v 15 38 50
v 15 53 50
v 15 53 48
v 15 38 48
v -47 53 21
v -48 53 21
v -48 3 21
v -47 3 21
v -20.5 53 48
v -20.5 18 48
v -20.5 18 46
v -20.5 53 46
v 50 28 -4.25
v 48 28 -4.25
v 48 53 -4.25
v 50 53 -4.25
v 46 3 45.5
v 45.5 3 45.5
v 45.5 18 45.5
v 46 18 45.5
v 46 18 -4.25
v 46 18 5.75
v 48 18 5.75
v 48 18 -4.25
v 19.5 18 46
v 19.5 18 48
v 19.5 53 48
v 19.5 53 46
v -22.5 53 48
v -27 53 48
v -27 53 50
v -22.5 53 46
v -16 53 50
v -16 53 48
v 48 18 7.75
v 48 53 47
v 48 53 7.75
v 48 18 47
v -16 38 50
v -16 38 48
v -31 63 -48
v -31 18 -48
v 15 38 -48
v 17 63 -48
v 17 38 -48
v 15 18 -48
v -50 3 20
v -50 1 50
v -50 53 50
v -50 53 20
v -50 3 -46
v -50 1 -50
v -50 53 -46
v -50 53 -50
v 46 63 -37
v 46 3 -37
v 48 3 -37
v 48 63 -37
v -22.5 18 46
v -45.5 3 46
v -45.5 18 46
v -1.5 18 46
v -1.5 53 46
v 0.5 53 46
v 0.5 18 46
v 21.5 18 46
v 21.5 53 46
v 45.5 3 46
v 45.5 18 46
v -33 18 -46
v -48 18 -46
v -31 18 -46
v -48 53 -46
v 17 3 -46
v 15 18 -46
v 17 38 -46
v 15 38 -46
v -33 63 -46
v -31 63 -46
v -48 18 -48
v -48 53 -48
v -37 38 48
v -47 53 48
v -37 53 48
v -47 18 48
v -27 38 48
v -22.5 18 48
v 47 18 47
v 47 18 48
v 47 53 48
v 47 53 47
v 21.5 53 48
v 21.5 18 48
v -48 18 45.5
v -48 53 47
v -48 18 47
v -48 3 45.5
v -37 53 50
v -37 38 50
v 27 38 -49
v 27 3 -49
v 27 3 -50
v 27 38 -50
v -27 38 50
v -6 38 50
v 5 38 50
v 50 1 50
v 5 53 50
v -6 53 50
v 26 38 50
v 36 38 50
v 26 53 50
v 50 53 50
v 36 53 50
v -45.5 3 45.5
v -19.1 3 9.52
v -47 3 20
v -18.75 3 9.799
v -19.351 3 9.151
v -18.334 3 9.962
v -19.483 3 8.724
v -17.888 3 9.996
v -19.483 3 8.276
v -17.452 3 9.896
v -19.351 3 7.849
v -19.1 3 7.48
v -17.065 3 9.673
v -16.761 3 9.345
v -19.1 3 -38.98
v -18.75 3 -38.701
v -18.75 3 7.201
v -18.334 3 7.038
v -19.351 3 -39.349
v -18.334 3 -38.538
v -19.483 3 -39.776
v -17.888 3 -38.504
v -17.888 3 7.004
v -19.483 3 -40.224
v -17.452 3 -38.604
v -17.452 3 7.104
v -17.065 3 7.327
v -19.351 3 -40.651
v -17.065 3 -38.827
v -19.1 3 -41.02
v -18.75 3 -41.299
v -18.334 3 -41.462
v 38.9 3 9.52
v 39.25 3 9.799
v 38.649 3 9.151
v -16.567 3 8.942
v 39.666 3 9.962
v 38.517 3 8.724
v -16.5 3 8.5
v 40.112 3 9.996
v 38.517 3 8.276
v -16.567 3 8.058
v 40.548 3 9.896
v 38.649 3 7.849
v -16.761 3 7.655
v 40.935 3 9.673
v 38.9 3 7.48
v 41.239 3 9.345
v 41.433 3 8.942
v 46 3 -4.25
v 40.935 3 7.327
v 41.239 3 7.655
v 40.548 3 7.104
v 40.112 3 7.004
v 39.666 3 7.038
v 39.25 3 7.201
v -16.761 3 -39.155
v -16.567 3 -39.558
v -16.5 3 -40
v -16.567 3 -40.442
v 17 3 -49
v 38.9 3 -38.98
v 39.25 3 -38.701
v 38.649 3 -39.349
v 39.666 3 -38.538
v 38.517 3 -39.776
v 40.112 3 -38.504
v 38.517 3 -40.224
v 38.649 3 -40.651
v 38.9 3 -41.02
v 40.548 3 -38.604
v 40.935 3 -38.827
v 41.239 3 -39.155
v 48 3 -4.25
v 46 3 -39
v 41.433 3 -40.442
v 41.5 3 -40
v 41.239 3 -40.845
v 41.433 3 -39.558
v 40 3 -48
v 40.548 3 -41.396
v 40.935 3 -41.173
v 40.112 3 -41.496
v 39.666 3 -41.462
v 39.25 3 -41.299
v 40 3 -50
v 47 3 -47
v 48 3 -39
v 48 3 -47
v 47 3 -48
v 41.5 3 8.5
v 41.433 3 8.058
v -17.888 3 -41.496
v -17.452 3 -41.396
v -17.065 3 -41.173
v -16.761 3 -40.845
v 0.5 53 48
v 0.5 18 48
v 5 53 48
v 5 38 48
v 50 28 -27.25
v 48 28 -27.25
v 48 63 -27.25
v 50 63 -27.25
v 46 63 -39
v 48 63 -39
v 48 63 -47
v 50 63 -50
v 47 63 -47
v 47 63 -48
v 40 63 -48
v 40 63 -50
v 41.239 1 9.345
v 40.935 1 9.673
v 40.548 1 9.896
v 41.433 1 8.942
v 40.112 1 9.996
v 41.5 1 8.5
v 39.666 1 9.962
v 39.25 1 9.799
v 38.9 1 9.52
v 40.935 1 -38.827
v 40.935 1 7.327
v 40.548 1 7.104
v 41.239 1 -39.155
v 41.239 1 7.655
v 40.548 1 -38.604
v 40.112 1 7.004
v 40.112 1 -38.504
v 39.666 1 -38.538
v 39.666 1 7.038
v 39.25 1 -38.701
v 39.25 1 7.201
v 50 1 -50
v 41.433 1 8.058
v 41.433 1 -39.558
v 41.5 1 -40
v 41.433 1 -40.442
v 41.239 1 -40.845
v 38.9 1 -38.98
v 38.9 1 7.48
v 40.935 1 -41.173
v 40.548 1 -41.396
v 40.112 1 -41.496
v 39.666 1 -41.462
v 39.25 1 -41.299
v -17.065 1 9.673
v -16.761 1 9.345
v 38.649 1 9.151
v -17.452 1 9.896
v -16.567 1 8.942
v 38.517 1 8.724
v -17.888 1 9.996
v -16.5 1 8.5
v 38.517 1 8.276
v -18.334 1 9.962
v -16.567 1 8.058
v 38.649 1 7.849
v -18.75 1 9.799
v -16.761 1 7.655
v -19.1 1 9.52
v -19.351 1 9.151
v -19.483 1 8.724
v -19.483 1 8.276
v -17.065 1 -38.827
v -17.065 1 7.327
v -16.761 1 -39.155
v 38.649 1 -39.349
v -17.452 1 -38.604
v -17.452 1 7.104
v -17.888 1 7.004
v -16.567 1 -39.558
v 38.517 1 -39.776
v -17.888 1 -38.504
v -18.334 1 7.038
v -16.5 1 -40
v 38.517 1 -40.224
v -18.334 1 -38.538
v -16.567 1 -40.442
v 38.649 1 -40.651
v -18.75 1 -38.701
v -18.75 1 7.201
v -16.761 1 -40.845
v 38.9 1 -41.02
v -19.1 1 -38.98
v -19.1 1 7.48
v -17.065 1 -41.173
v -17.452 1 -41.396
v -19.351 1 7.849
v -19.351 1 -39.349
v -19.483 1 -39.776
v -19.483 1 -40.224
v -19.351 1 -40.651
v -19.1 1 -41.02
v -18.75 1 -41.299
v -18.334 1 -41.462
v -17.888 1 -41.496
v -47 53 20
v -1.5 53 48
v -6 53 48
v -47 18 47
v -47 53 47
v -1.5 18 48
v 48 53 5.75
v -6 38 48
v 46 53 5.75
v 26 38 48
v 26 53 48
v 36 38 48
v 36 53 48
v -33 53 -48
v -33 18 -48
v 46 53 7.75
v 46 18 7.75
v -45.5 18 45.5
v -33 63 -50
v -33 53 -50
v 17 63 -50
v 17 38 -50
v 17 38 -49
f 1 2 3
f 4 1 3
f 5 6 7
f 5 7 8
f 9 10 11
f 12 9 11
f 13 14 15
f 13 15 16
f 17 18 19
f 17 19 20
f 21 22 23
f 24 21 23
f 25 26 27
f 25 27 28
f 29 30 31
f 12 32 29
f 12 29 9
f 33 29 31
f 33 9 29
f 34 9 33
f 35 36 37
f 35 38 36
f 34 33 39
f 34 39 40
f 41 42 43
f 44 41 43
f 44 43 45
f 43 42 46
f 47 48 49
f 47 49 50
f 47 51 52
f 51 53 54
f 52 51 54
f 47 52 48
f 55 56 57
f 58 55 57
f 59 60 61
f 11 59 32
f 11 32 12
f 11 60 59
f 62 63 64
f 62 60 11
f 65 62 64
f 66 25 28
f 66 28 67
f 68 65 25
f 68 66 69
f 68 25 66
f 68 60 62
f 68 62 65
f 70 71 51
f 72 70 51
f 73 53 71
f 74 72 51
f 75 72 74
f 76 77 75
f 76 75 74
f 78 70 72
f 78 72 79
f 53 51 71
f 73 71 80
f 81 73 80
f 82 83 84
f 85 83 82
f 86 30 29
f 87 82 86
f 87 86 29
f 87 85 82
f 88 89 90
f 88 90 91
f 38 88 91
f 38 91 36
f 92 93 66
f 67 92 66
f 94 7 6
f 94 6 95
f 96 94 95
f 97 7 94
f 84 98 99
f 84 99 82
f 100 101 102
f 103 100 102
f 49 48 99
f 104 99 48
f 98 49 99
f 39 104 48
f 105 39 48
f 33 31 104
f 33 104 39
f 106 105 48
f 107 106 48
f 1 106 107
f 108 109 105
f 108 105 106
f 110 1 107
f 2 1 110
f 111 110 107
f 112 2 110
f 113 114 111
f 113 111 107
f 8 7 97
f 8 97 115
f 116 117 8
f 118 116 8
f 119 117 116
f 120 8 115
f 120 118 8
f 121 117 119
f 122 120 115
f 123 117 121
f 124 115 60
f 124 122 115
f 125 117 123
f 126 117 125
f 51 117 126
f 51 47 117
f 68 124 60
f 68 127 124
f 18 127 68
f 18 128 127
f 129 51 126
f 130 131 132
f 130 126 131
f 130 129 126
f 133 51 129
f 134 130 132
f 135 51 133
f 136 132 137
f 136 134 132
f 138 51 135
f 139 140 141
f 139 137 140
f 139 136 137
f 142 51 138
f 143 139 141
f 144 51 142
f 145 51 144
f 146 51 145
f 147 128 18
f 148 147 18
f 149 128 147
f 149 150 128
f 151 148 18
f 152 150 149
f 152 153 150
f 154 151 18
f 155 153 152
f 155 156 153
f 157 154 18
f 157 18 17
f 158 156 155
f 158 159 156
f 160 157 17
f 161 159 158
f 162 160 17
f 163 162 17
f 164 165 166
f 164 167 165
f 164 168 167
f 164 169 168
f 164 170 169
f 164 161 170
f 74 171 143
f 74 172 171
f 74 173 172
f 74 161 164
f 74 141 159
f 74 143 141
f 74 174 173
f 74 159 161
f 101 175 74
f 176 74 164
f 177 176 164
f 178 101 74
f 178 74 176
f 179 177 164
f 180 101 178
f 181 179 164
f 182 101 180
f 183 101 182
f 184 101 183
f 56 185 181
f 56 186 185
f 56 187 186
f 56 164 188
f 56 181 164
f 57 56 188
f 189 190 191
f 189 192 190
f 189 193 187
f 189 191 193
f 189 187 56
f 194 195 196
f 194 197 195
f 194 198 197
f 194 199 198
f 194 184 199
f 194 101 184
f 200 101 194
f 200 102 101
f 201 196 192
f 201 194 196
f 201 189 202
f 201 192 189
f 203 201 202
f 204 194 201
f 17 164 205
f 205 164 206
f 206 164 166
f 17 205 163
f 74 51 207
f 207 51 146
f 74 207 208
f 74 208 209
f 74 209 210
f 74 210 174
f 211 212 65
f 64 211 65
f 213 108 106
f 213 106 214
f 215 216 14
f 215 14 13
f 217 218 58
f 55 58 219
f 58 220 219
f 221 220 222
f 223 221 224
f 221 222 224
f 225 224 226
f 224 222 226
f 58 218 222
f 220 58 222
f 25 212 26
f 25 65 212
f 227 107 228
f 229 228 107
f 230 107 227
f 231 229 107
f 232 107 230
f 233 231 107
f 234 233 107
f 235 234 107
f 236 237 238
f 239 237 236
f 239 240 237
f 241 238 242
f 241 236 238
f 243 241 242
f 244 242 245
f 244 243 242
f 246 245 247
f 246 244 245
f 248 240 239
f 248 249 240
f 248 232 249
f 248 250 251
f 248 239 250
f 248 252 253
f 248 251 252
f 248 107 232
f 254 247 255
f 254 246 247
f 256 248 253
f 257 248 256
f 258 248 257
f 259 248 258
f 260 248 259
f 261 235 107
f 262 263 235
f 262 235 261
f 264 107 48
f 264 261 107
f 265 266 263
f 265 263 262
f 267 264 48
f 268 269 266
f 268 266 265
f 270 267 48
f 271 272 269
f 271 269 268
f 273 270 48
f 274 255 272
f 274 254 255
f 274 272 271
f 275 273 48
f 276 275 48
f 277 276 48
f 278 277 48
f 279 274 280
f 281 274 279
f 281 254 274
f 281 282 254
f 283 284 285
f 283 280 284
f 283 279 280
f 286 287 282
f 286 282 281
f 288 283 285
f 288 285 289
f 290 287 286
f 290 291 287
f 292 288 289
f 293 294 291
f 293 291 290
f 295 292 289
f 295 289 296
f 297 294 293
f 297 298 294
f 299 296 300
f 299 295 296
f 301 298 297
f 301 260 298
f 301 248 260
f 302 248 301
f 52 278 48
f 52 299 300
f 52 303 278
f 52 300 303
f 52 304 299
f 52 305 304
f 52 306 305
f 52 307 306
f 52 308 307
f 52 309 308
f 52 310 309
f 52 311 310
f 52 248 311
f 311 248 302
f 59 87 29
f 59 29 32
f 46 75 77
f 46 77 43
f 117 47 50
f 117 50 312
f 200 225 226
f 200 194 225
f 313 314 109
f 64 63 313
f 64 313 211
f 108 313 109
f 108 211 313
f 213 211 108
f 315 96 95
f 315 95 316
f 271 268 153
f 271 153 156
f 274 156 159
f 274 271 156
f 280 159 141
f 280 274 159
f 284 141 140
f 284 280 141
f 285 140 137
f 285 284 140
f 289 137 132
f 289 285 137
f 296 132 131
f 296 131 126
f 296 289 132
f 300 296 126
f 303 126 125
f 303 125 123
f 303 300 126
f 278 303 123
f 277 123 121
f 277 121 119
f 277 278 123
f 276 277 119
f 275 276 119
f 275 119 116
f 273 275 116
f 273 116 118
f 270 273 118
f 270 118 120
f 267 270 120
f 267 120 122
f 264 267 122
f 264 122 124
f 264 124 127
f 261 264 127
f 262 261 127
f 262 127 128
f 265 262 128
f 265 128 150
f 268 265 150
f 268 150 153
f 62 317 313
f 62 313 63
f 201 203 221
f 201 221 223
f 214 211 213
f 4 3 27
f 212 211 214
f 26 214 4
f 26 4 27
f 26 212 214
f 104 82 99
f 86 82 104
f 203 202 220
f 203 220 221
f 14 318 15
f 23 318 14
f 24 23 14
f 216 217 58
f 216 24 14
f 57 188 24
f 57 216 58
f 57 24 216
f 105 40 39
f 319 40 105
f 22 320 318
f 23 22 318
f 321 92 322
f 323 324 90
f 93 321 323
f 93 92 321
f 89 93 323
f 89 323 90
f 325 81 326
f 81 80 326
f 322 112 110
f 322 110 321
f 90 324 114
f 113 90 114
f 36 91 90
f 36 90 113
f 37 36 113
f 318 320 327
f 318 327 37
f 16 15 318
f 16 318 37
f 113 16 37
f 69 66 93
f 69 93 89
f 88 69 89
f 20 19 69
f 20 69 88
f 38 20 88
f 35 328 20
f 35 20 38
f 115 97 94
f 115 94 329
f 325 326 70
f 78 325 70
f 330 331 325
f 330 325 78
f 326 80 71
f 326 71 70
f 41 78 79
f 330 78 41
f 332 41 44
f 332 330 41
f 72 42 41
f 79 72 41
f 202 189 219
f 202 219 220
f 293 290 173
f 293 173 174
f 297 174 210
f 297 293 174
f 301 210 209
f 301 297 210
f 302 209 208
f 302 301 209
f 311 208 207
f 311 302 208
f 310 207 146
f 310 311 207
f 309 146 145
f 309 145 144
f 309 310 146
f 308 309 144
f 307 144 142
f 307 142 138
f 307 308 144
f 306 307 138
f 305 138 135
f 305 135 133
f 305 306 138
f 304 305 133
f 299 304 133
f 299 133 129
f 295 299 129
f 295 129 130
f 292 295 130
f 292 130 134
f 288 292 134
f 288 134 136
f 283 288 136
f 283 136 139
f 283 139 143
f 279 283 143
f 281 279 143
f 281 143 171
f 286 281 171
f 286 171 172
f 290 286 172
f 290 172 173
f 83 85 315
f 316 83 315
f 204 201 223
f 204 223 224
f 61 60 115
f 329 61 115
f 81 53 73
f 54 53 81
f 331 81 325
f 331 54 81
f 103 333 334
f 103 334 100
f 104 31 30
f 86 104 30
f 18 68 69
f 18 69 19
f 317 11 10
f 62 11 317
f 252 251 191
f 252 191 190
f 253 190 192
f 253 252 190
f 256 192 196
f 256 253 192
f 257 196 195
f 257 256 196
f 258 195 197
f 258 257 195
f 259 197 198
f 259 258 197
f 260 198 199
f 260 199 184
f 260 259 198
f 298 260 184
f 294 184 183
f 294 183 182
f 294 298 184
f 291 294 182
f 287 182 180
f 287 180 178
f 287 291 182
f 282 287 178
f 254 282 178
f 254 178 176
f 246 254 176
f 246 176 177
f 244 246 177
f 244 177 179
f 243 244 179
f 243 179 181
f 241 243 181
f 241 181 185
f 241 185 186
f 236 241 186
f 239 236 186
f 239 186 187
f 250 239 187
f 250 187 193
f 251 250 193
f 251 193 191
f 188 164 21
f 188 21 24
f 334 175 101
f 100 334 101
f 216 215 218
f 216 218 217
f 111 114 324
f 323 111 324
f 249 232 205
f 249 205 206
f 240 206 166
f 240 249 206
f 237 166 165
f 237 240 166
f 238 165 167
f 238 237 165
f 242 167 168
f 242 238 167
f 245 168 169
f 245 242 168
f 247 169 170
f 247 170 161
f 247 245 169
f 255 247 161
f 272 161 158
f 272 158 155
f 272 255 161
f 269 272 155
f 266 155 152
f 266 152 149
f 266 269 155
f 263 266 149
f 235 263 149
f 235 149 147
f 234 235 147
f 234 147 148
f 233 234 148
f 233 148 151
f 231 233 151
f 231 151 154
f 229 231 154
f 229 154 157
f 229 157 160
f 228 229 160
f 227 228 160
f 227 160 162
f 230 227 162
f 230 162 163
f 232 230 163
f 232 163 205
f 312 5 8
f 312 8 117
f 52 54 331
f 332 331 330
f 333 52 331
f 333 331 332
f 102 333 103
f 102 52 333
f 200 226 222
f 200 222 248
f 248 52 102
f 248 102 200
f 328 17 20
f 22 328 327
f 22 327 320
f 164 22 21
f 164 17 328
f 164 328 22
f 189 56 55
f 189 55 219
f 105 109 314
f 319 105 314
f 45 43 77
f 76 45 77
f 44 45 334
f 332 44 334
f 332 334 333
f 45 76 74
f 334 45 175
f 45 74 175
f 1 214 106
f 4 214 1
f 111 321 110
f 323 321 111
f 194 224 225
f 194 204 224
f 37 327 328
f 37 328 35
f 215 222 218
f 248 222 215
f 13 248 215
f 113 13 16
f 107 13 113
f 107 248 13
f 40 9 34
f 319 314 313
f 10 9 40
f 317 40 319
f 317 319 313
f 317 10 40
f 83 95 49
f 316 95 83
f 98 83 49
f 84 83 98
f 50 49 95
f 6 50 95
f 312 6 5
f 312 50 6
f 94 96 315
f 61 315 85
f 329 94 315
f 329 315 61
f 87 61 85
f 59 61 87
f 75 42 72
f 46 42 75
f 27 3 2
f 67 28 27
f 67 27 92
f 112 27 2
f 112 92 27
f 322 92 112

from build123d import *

# Parameters (mm, degrees)
SKICA1_W                  = 100
SKICA1_H                  = 100
P_IDAT_VYSUNUT_M1_DEPTH   = 3
SKICA2_R                  = 1.5
ODEBRAT_VYSUNUT_M5_DEPTH  = 3
SKICA3_W                  = 75
SKICA3_H                  = 2
P_IDAT_VYSUNUT_M4_DEPTH   = 53
SKICA10_W                 = 8
SKICA10_H                 = 2
ODEBRAT_VYSUNUT_M6_DEPTH  = 50
SKICA11_W                 = 10
SKICA11_H                 = 2
ODEBRAT_VYSUNUT_M8_DEPTH  = 15
SKICA16_W                 = 67
SKICA16_H                 = 2
P_IDAT_VYSUNUT_M6_DEPTH   = 15
SKICA17_W                 = 2.5
SKICA17_H                 = 2.5
P_IDAT_VYSUNUT_M7_DEPTH   = 15
SKICA18_W                 = 2.5
SKICA18_H                 = 2.5
P_IDAT_VYSUNUT_M8_DEPTH   = 15
SKICA19_W                 = 1
SKICA19_H                 = 1
P_IDAT_VYSUNUT_M10_DEPTH  = 50
SKICA20_W                 = 1
SKICA20_H                 = 1
P_IDAT_VYSUNUT_M11_DEPTH  = 35
SKICA21_W                 = 1
SKICA21_H                 = 1
P_IDAT_VYSUNUT_M12_DEPTH  = 35
SKICA22_W                 = 1
SKICA22_H                 = 1
P_IDAT_VYSUNUT_M13_DEPTH  = 50
SKICA24_W                 = 91
SKICA24_H                 = 2
P_IDAT_VYSUNUT_M14_DEPTH  = 15
SKICA25_W                 = 2
SKICA25_H                 = 2
P_IDAT_VYSUNUT_M15_DEPTH  = 35
SKICA26_W                 = 2
SKICA26_H                 = 2
P_IDAT_VYSUNUT_M16_DEPTH  = 35
SKICA27_W                 = 2
SKICA27_H                 = 49.75
P_IDAT_VYSUNUT_M17_DEPTH  = 15
SKICA28_W                 = 100
SKICA28_H                 = 5
P_IDAT_VYSUNUT_M18_DEPTH  = 5
SKICA30_W                 = 5
SKICA30_H                 = 90
P_IDAT_VYSUNUT_M19_DEPTH  = 5
SKICA31_W                 = 100
SKICA31_H                 = 100
ODEBRAT_VYSUNUT_M9_DEPTH  = 6
SKICA32_W                 = 2
SKICA32_H                 = 15
ODEBRAT_VYSUNUT_M10_DEPTH = 6
SKICA33_W                 = 2
SKICA33_H                 = 23
P_IDAT_VYSUNUT_M22_DEPTH  = 25
P_IDAT_VYSUNUT_M23_DEPTH  = 10
SKICA35_W                 = 50
SKICA35_H                 = 2
P_IDAT_VYSUNUT_M24_DEPTH  = 10
SKICA36_W                 = 2
SKICA36_H                 = 45
P_IDAT_VYSUNUT_M25_DEPTH  = 2
SKICA37_W                 = 2
SKICA37_H                 = 2
P_IDAT_VYSUNUT_M26_DEPTH  = 60
SKICA38_W                 = 10
SKICA38_H                 = 1
P_IDAT_VYSUNUT_M27_DEPTH  = 35
SKICA40_W                 = 2
SKICA40_H                 = 2
P_IDAT_VYSUNUT_M29_DEPTH  = 35


with BuildPart() as part:
    # Skica1 → Přidat vysunutím1 (new body)
    with BuildSketch(Plane(origin=(0, 0, 0), x_dir=(1, 0, 0), z_dir=(0, 1, 0))):
        Rectangle(SKICA1_W, SKICA1_H)
    extrude(amount=P_IDAT_VYSUNUT_M1_DEPTH)

    # Skica2 → Odebrat vysunutím5 (cut)
    with BuildSketch(Plane(origin=(0, 0, 0), x_dir=(1, 0, 0), z_dir=(0, 1, 0))):
        with Locations((-18, 40)):
            Circle(SKICA2_R)
        with Locations((40, 40)):
            Circle(SKICA2_R)
        with Locations((40, -8.5)):
            Circle(SKICA2_R)
        with Locations((-18, -8.5)):
            Circle(SKICA2_R)
    extrude(amount=ODEBRAT_VYSUNUT_M5_DEPTH, mode=Mode.SUBTRACT)

    # Skica3 → Přidat vysunutím4 (add)
    with BuildSketch(Plane(origin=(0, 0, 0), x_dir=(1, 0, 0), z_dir=(0, 1, 0))):
        Polygon((40, 50), (40, 48), (48, 48), (48, 27.25), (50, 27.25), (50, 50), align=None)
        Polygon((-50, -20), (-48, -20), (-48, -48), (48, -48), (48, 4.25), (50, 4.25), (50, -50), (-50, -50), align=None)
        with Locations((-12.5, 49)):
            Rectangle(SKICA3_W, SKICA3_H)
    extrude(amount=P_IDAT_VYSUNUT_M4_DEPTH)

    # Skica10 → Odebrat vysunutím6 (cut)
    with BuildSketch(Plane(origin=(0, 53, 0), x_dir=(1, 0, 0), z_dir=(0, 1, 0))):
        with Locations((21, 49)):
            Rectangle(SKICA10_W, SKICA10_H)
    extrude(amount=-ODEBRAT_VYSUNUT_M6_DEPTH, mode=Mode.SUBTRACT)

    # Skica11 → Odebrat vysunutím8 (cut)
    with BuildSketch(Plane(origin=(0, 53, 0), x_dir=(1, 0, 0), z_dir=(0, 1, 0))):
        with Locations((-32, -49)):
            Rectangle(SKICA11_W, SKICA11_H)
        with Locations((-11, -49)):
            Rectangle(SKICA11_W, SKICA11_H)
        with Locations((10, -49)):
            Rectangle(SKICA11_W, SKICA11_H)
        with Locations((31, -49)):
            Rectangle(SKICA11_W, SKICA11_H)
    extrude(amount=-ODEBRAT_VYSUNUT_M8_DEPTH, mode=Mode.SUBTRACT)

    # Skica16 → Přidat vysunutím6 (add)
    with BuildSketch(Plane(origin=(0, 3, 0), x_dir=(1, 0, 0), z_dir=(0, 1, 0))):
        with Locations((-16.5, 47)):
            Rectangle(SKICA16_W, SKICA16_H)
    extrude(amount=P_IDAT_VYSUNUT_M6_DEPTH)

    # Skica17 → Přidat vysunutím7 (add)
    with BuildSketch(Plane(origin=(0, 3, 0), x_dir=(1, 0, 0), z_dir=(0, 1, 0))):
        with Locations((46.75, -46.75)):
            Rectangle(SKICA17_W, SKICA17_H)
    extrude(amount=P_IDAT_VYSUNUT_M7_DEPTH)

    # Skica18 → Přidat vysunutím8 (add)
    with BuildSketch(Plane(origin=(0, 3, 0), x_dir=(1, 0, 0), z_dir=(0, 1, 0))):
        with Locations((-46.75, -46.75)):
            Rectangle(SKICA18_W, SKICA18_H)
    extrude(amount=P_IDAT_VYSUNUT_M8_DEPTH)

    # Skica19 → Přidat vysunutím10 (add)
    with BuildSketch(Plane(origin=(0, 3, 0), x_dir=(1, 0, 0), z_dir=(0, 1, 0))):
        with Locations((47.5, 47.5)):
            Rectangle(SKICA19_W, SKICA19_H)
    extrude(amount=P_IDAT_VYSUNUT_M10_DEPTH)

    # Skica20 → Přidat vysunutím11 (add)
    with BuildSketch(Plane(origin=(0, 18, 0), x_dir=(1, 0, 0), z_dir=(0, 1, 0))):
        with Locations((47.5, -47.5)):
            Rectangle(SKICA20_W, SKICA20_H)
    extrude(amount=P_IDAT_VYSUNUT_M11_DEPTH)

    # Skica21 → Přidat vysunutím12 (add)
    with BuildSketch(Plane(origin=(0, 18, 0), x_dir=(1, 0, 0), z_dir=(0, 1, 0))):
        with Locations((-47.5, -47.5)):
            Rectangle(SKICA21_W, SKICA21_H)
    extrude(amount=P_IDAT_VYSUNUT_M12_DEPTH)

    # Skica22 → Přidat vysunutím13 (add)
    with BuildSketch(Plane(origin=(0, 3, 0), x_dir=(1, 0, 0), z_dir=(0, 1, 0))):
        with Locations((-47.5, -20.5)):
            Rectangle(SKICA22_W, SKICA22_H)
    extrude(amount=P_IDAT_VYSUNUT_M13_DEPTH)

    # Skica24 → Přidat vysunutím14 (add)
    with BuildSketch(Plane(origin=(0, 3, 0), x_dir=(1, 0, 0), z_dir=(0, 1, 0))):
        with Locations((0, -47)):
            Rectangle(SKICA24_W, SKICA24_H)
    extrude(amount=P_IDAT_VYSUNUT_M14_DEPTH)

    # Skica25 → Přidat vysunutím15 (add)
    with BuildSketch(Plane(origin=(0, 18, 0), x_dir=(1, 0, 0), z_dir=(0, 1, 0))):
        with Locations((20.5, -47)):
            Rectangle(SKICA25_W, SKICA25_H)
        with Locations((-0.5, -47)):
            Rectangle(SKICA25_W, SKICA25_H)
        with Locations((-21.5, -47)):
            Rectangle(SKICA25_W, SKICA25_H)
    extrude(amount=P_IDAT_VYSUNUT_M15_DEPTH)

    # Skica26 → Přidat vysunutím16 (add)
    with BuildSketch(Plane(origin=(0, 18, 0), x_dir=(1, 0, 0), z_dir=(0, 1, 0))):
        with Locations((-49, 47)):
            Rectangle(SKICA26_W, SKICA26_H)
        with Locations((16, 47)):
            Rectangle(SKICA26_W, SKICA26_H)
    extrude(amount=P_IDAT_VYSUNUT_M16_DEPTH)

    # Skica27 → Přidat vysunutím17 (add)
    with BuildSketch(Plane(origin=(0, 3, 0), x_dir=(1, 0, 0), z_dir=(0, 1, 0))):
        with Locations((47, -20.625)):
            Rectangle(SKICA27_W, SKICA27_H)
    extrude(amount=P_IDAT_VYSUNUT_M17_DEPTH)

    # Skica28 → Přidat vysunutím18 (add)
    with BuildSketch(Plane(origin=(0, 0, 0), x_dir=(1, 0, 0), z_dir=(0, 1, 0))):
        with Locations((0, -47.5)):
            Rectangle(SKICA28_W, SKICA28_H)
        with Locations((0, 47.5)):
            Rectangle(SKICA28_W, SKICA28_H)
    extrude(amount=-P_IDAT_VYSUNUT_M18_DEPTH)

    # Skica30 → Přidat vysunutím19 (add)
    with BuildSketch(Plane(origin=(0, 0, 0), x_dir=(-1, 0, 0), z_dir=(0, -1, 0))):
        with Locations((47.5, 0)):
            Rectangle(SKICA30_W, SKICA30_H)
        with Locations((-47.5, 0)):
            Rectangle(SKICA30_W, SKICA30_H)
    extrude(amount=P_IDAT_VYSUNUT_M19_DEPTH)

    # Skica31 → Odebrat vysunutím9 (cut)
    with BuildSketch(Plane(origin=(0, -5, 0), x_dir=(-1, 0, 0), z_dir=(0, -1, 0))):
        Rectangle(SKICA31_W, SKICA31_H)
    extrude(amount=-ODEBRAT_VYSUNUT_M9_DEPTH, mode=Mode.SUBTRACT)

    # Skica32 → Odebrat vysunutím10 (cut)
    with BuildSketch(Plane.ZY.offset(-15)):
        with Locations((-47, 45.5)):
            Rectangle(SKICA32_W, SKICA32_H)
    extrude(amount=-ODEBRAT_VYSUNUT_M10_DEPTH, mode=Mode.SUBTRACT)

    # Skica33 → Přidat vysunutím22 (add)
    with BuildSketch(Plane(origin=(0, 3, 0), x_dir=(1, 0, 0), z_dir=(0, 1, 0))):
        with Locations((49, 15.75)):
            Rectangle(SKICA33_W, SKICA33_H)
    extrude(amount=P_IDAT_VYSUNUT_M22_DEPTH)

    # Skica34 → Přidat vysunutím23 (add)
    with BuildSketch(Plane(origin=(0, 53, 0), x_dir=(1, 0, 0), z_dir=(0, 1, 0))):
        Polygon((40, 50), (50, 50), (50, 27.25), (48, 27.25), (48, 47), (47, 47), (47, 48), (40, 48), align=None)
    extrude(amount=P_IDAT_VYSUNUT_M23_DEPTH)

    # Skica35 → Přidat vysunutím24 (add)
    with BuildSketch(Plane(origin=(0, 53, 0), x_dir=(1, 0, 0), z_dir=(0, 1, 0))):
        with Locations((-8, 49)):
            Rectangle(SKICA35_W, SKICA35_H)
    extrude(amount=P_IDAT_VYSUNUT_M24_DEPTH)

    # Skica36 → Přidat vysunutím25 (add)
    with BuildSketch(Plane.XY.offset(-48)):
        with Locations((-32, 40.5)):
            Rectangle(SKICA36_W, SKICA36_H)
    extrude(amount=P_IDAT_VYSUNUT_M25_DEPTH)

    # Skica37 → Přidat vysunutím26 (add)
    with BuildSketch(Plane(origin=(0, 3, 0), x_dir=(1, 0, 0), z_dir=(0, 1, 0))):
        with Locations((47, 38)):
            Rectangle(SKICA37_W, SKICA37_H)
    extrude(amount=P_IDAT_VYSUNUT_M26_DEPTH)

    # Skica38 → Přidat vysunutím27 (add)
    with BuildSketch(Plane(origin=(0, 3, 0), x_dir=(1, 0, 0), z_dir=(0, 1, 0))):
        with Locations((22, 49.5)):
            Rectangle(SKICA38_W, SKICA38_H)
    extrude(amount=P_IDAT_VYSUNUT_M27_DEPTH)

    # Skica40 → Přidat vysunutím29 (add)
    with BuildSketch(Plane(origin=(0, 53, 0), x_dir=(1, 0, 0), z_dir=(0, 1, 0))):
        with Locations((47, -6.75)):
            Rectangle(SKICA40_W, SKICA40_H)
    extrude(amount=-P_IDAT_VYSUNUT_M29_DEPTH)


solid = part.part
